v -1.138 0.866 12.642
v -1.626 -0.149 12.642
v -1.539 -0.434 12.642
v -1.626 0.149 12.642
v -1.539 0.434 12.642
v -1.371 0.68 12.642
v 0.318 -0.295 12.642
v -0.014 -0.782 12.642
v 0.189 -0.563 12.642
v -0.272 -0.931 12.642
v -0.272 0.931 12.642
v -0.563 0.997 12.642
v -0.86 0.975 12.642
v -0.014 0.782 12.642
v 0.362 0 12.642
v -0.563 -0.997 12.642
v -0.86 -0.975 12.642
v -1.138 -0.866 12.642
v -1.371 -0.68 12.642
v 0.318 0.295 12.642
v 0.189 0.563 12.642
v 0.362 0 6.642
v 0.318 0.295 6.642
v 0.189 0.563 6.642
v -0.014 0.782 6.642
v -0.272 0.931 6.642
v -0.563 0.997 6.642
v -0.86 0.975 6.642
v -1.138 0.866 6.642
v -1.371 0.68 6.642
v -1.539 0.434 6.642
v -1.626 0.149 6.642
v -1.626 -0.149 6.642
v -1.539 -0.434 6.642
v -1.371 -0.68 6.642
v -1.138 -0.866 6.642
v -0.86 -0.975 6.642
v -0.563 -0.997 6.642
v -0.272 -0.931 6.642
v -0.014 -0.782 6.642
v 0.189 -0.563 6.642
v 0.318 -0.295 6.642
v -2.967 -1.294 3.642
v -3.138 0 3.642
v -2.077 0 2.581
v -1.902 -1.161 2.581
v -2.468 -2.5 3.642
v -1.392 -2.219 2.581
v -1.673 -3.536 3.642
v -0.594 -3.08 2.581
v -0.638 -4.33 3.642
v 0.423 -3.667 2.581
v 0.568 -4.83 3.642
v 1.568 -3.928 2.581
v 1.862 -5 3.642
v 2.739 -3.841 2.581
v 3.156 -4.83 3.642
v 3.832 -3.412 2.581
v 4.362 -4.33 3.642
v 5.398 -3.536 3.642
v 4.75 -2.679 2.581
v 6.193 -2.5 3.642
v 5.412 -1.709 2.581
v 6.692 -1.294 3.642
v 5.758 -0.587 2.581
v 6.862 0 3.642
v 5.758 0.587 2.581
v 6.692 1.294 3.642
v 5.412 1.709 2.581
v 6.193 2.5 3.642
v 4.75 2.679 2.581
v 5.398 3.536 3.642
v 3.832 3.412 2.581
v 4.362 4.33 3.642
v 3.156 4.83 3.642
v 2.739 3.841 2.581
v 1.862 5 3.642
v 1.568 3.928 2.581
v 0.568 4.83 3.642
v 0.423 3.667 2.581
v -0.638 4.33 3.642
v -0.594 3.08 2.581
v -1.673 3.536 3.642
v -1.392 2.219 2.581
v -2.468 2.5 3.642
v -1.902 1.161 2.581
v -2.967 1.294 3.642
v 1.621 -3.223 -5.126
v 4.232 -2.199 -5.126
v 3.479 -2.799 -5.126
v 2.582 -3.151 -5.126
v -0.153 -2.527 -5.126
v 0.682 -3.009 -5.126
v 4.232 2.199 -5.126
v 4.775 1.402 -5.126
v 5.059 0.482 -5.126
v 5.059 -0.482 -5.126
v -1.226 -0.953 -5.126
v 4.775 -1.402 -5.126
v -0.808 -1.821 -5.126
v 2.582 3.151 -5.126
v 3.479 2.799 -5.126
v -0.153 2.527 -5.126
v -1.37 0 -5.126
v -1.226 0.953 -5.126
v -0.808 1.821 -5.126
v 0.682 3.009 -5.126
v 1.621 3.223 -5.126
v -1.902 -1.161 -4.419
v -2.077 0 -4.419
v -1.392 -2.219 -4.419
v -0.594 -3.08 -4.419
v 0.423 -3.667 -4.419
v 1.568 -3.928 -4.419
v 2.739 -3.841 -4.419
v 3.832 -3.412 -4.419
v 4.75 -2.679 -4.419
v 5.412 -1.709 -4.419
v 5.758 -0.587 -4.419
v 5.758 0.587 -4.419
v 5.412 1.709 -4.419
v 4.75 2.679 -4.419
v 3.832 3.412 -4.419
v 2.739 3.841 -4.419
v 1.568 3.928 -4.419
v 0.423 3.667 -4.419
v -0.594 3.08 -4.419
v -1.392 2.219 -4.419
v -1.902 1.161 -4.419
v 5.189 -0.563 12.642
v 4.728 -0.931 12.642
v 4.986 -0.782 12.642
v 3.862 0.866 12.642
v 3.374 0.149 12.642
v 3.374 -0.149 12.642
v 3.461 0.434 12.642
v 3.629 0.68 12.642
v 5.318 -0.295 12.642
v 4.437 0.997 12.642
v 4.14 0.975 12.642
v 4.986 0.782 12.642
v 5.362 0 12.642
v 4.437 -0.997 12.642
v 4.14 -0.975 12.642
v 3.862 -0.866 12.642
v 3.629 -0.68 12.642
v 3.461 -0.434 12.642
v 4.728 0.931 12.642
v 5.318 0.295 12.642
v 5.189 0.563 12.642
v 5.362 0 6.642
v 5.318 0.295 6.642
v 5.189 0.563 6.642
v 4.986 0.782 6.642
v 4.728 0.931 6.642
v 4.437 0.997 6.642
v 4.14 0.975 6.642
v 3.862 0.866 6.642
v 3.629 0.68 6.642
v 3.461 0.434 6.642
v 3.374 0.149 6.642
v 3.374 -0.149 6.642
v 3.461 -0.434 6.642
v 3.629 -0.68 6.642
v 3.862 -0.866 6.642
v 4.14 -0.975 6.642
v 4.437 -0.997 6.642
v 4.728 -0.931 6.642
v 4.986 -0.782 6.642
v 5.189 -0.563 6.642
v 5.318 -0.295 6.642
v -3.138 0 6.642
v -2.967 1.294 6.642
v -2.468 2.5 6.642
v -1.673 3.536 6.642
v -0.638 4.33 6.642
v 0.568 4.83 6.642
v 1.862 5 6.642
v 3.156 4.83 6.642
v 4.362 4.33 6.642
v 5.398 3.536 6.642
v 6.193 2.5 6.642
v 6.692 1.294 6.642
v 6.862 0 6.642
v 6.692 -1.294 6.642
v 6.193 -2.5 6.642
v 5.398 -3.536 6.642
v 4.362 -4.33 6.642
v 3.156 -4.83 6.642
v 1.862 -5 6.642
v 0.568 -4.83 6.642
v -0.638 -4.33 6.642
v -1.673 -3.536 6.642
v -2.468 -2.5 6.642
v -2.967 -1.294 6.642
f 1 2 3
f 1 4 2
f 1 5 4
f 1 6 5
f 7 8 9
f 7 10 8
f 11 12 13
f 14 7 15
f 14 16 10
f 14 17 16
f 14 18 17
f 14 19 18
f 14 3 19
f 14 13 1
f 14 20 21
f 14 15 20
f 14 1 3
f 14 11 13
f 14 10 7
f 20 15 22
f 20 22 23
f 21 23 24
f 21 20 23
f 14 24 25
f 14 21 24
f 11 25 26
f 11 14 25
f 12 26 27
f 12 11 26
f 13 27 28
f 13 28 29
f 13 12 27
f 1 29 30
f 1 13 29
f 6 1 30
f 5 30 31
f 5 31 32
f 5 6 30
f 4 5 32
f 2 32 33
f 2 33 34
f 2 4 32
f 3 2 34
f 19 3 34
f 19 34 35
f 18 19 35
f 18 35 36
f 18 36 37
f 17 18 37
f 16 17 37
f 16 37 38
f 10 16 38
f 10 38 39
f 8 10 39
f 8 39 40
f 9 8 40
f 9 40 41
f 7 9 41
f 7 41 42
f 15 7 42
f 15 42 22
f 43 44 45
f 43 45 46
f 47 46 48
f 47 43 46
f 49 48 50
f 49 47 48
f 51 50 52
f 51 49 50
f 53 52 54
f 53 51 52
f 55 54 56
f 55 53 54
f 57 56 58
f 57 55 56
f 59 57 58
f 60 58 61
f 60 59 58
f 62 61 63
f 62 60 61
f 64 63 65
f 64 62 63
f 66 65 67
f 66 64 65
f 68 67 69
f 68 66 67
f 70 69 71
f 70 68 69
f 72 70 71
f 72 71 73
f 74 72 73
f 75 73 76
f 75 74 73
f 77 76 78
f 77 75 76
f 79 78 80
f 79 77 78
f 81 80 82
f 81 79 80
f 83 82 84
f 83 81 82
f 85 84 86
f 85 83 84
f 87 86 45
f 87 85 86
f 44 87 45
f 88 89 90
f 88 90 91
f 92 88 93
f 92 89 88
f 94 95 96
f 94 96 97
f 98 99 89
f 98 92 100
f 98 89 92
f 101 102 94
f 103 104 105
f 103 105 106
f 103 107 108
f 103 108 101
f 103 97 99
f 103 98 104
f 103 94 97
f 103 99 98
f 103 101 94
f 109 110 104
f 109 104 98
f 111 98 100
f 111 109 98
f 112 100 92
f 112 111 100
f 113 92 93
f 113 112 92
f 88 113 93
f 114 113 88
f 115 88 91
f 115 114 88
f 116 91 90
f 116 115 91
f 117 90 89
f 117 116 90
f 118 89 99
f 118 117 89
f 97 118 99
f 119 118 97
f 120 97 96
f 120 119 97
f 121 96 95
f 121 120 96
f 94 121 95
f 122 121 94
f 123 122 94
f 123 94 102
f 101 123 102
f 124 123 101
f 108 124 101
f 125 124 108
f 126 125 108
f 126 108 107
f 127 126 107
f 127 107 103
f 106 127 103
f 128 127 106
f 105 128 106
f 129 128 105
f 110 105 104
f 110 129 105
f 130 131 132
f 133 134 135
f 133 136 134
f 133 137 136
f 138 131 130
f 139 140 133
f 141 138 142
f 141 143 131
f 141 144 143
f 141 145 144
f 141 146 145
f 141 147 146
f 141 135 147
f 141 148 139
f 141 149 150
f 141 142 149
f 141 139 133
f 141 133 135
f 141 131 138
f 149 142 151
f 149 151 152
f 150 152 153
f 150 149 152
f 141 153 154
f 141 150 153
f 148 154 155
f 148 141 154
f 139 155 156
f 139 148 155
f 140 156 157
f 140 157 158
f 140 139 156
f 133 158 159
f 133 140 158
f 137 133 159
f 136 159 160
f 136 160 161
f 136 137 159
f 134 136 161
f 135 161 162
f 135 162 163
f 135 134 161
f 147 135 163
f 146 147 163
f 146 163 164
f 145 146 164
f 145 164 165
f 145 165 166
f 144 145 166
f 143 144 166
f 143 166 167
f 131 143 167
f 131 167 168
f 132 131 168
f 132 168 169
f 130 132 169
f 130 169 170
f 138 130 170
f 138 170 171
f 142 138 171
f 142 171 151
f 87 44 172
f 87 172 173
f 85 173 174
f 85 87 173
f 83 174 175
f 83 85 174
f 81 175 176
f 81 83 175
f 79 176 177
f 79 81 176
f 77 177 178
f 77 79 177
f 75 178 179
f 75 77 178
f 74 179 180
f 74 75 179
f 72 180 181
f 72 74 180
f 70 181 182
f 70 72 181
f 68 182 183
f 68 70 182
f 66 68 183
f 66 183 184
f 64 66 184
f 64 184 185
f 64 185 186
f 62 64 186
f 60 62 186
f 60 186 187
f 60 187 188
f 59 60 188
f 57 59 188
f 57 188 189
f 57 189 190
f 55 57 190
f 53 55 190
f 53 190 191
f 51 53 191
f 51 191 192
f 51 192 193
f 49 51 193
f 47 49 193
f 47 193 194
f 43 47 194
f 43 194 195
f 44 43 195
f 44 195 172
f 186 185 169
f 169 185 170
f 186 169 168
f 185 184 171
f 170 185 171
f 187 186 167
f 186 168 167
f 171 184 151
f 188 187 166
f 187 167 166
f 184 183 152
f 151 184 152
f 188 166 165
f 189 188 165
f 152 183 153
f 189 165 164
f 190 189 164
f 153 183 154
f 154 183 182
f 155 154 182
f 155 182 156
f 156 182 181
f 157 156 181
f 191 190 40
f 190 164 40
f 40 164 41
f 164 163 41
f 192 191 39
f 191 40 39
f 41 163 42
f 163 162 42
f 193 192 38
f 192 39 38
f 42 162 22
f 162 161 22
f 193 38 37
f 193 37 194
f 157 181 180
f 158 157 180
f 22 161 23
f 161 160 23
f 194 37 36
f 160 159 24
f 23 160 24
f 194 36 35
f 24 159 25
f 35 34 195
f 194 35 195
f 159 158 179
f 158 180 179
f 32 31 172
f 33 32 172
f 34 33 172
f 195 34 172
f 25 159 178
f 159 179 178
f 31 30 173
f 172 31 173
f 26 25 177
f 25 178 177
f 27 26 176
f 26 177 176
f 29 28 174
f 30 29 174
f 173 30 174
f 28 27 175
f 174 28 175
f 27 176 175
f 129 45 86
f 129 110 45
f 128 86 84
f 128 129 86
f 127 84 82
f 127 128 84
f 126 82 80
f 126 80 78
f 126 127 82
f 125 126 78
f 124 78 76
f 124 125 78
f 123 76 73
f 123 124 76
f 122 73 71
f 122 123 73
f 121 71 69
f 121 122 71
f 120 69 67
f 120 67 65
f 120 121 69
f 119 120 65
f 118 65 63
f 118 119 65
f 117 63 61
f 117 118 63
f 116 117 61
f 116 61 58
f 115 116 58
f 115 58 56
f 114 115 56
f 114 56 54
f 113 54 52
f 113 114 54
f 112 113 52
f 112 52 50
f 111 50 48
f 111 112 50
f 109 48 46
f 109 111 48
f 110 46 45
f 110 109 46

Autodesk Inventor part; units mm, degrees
ref_plane "YZ Plane" through (0, 0, 0) normal (1, 0, 0) x (0, 1, 0)
ref_plane "XZ Plane" through (0, 0, 0) normal (0, 1, 0) x (-1, 0, 0)
ref_plane "XY Plane" through (0, 0, 0) normal (0, 0, 1) x (1, 0, 0)
sketch "Эскиз1" plane through (0, 0, 0) normal (0, 1, 0) x (-1, 0, 0)
  line L0 (3.1376, 6.642) -> (-6.8624, 6.642)
  line L1 (-6.8624, 6.642) -> (-6.8624, 3.642)
  line L2 (3.1376, 6.642) -> (3.1376, 3.642)
  line L3 (3.1376, 3.642) -> (2.077, 2.5813)
  line L4 (-6.8624, 3.642) -> (-5.8017, 2.5813)
  line L5 (2.077, 2.5813) -> (2.077, -4.4187)
  line L6 (2.077, -4.4187) -> (1.3699, -5.1258)
  line L7 (-5.8017, 2.5813) -> (-5.8017, -4.4187)
  line L8 (-5.8017, -4.4187) -> (-5.0946, -5.1258)
  line L9 (1.3699, -5.1258) -> (-5.0946, -5.1258)
  line L10 (-1.8624, 6.642) -> (-1.8624, -5.1258)
  point P0 (0, 0)
revolve "Вращение1" add sketch "Эскиз1" angle 360 about axis through (1.8624, 0, 6.642) along (0, 0, -1) contours L2 L3 L5 L6 L9 L10 L0
sketch "Эскиз6" plane through (1.8624, 0, 6.642) normal (0, 0, 1) x (1, 0, 0)
  circle A0 centre (0, 0) radius 3.2322 projected
  circle A1 centre (-2.5, 0) radius 1
  circle A2 centre (2.5, 0) radius 1
sketch3d "3D эскиз3"
  line L0 (-0.6376, 0, 6.642) -> (-0.6376, 0, 12.642)
sweep "Сдвиг2" add profiles "Эскиз6" path "3D эскиз3" contours A0 A2 | A0 A2 | A1 A0 | A0 A1
